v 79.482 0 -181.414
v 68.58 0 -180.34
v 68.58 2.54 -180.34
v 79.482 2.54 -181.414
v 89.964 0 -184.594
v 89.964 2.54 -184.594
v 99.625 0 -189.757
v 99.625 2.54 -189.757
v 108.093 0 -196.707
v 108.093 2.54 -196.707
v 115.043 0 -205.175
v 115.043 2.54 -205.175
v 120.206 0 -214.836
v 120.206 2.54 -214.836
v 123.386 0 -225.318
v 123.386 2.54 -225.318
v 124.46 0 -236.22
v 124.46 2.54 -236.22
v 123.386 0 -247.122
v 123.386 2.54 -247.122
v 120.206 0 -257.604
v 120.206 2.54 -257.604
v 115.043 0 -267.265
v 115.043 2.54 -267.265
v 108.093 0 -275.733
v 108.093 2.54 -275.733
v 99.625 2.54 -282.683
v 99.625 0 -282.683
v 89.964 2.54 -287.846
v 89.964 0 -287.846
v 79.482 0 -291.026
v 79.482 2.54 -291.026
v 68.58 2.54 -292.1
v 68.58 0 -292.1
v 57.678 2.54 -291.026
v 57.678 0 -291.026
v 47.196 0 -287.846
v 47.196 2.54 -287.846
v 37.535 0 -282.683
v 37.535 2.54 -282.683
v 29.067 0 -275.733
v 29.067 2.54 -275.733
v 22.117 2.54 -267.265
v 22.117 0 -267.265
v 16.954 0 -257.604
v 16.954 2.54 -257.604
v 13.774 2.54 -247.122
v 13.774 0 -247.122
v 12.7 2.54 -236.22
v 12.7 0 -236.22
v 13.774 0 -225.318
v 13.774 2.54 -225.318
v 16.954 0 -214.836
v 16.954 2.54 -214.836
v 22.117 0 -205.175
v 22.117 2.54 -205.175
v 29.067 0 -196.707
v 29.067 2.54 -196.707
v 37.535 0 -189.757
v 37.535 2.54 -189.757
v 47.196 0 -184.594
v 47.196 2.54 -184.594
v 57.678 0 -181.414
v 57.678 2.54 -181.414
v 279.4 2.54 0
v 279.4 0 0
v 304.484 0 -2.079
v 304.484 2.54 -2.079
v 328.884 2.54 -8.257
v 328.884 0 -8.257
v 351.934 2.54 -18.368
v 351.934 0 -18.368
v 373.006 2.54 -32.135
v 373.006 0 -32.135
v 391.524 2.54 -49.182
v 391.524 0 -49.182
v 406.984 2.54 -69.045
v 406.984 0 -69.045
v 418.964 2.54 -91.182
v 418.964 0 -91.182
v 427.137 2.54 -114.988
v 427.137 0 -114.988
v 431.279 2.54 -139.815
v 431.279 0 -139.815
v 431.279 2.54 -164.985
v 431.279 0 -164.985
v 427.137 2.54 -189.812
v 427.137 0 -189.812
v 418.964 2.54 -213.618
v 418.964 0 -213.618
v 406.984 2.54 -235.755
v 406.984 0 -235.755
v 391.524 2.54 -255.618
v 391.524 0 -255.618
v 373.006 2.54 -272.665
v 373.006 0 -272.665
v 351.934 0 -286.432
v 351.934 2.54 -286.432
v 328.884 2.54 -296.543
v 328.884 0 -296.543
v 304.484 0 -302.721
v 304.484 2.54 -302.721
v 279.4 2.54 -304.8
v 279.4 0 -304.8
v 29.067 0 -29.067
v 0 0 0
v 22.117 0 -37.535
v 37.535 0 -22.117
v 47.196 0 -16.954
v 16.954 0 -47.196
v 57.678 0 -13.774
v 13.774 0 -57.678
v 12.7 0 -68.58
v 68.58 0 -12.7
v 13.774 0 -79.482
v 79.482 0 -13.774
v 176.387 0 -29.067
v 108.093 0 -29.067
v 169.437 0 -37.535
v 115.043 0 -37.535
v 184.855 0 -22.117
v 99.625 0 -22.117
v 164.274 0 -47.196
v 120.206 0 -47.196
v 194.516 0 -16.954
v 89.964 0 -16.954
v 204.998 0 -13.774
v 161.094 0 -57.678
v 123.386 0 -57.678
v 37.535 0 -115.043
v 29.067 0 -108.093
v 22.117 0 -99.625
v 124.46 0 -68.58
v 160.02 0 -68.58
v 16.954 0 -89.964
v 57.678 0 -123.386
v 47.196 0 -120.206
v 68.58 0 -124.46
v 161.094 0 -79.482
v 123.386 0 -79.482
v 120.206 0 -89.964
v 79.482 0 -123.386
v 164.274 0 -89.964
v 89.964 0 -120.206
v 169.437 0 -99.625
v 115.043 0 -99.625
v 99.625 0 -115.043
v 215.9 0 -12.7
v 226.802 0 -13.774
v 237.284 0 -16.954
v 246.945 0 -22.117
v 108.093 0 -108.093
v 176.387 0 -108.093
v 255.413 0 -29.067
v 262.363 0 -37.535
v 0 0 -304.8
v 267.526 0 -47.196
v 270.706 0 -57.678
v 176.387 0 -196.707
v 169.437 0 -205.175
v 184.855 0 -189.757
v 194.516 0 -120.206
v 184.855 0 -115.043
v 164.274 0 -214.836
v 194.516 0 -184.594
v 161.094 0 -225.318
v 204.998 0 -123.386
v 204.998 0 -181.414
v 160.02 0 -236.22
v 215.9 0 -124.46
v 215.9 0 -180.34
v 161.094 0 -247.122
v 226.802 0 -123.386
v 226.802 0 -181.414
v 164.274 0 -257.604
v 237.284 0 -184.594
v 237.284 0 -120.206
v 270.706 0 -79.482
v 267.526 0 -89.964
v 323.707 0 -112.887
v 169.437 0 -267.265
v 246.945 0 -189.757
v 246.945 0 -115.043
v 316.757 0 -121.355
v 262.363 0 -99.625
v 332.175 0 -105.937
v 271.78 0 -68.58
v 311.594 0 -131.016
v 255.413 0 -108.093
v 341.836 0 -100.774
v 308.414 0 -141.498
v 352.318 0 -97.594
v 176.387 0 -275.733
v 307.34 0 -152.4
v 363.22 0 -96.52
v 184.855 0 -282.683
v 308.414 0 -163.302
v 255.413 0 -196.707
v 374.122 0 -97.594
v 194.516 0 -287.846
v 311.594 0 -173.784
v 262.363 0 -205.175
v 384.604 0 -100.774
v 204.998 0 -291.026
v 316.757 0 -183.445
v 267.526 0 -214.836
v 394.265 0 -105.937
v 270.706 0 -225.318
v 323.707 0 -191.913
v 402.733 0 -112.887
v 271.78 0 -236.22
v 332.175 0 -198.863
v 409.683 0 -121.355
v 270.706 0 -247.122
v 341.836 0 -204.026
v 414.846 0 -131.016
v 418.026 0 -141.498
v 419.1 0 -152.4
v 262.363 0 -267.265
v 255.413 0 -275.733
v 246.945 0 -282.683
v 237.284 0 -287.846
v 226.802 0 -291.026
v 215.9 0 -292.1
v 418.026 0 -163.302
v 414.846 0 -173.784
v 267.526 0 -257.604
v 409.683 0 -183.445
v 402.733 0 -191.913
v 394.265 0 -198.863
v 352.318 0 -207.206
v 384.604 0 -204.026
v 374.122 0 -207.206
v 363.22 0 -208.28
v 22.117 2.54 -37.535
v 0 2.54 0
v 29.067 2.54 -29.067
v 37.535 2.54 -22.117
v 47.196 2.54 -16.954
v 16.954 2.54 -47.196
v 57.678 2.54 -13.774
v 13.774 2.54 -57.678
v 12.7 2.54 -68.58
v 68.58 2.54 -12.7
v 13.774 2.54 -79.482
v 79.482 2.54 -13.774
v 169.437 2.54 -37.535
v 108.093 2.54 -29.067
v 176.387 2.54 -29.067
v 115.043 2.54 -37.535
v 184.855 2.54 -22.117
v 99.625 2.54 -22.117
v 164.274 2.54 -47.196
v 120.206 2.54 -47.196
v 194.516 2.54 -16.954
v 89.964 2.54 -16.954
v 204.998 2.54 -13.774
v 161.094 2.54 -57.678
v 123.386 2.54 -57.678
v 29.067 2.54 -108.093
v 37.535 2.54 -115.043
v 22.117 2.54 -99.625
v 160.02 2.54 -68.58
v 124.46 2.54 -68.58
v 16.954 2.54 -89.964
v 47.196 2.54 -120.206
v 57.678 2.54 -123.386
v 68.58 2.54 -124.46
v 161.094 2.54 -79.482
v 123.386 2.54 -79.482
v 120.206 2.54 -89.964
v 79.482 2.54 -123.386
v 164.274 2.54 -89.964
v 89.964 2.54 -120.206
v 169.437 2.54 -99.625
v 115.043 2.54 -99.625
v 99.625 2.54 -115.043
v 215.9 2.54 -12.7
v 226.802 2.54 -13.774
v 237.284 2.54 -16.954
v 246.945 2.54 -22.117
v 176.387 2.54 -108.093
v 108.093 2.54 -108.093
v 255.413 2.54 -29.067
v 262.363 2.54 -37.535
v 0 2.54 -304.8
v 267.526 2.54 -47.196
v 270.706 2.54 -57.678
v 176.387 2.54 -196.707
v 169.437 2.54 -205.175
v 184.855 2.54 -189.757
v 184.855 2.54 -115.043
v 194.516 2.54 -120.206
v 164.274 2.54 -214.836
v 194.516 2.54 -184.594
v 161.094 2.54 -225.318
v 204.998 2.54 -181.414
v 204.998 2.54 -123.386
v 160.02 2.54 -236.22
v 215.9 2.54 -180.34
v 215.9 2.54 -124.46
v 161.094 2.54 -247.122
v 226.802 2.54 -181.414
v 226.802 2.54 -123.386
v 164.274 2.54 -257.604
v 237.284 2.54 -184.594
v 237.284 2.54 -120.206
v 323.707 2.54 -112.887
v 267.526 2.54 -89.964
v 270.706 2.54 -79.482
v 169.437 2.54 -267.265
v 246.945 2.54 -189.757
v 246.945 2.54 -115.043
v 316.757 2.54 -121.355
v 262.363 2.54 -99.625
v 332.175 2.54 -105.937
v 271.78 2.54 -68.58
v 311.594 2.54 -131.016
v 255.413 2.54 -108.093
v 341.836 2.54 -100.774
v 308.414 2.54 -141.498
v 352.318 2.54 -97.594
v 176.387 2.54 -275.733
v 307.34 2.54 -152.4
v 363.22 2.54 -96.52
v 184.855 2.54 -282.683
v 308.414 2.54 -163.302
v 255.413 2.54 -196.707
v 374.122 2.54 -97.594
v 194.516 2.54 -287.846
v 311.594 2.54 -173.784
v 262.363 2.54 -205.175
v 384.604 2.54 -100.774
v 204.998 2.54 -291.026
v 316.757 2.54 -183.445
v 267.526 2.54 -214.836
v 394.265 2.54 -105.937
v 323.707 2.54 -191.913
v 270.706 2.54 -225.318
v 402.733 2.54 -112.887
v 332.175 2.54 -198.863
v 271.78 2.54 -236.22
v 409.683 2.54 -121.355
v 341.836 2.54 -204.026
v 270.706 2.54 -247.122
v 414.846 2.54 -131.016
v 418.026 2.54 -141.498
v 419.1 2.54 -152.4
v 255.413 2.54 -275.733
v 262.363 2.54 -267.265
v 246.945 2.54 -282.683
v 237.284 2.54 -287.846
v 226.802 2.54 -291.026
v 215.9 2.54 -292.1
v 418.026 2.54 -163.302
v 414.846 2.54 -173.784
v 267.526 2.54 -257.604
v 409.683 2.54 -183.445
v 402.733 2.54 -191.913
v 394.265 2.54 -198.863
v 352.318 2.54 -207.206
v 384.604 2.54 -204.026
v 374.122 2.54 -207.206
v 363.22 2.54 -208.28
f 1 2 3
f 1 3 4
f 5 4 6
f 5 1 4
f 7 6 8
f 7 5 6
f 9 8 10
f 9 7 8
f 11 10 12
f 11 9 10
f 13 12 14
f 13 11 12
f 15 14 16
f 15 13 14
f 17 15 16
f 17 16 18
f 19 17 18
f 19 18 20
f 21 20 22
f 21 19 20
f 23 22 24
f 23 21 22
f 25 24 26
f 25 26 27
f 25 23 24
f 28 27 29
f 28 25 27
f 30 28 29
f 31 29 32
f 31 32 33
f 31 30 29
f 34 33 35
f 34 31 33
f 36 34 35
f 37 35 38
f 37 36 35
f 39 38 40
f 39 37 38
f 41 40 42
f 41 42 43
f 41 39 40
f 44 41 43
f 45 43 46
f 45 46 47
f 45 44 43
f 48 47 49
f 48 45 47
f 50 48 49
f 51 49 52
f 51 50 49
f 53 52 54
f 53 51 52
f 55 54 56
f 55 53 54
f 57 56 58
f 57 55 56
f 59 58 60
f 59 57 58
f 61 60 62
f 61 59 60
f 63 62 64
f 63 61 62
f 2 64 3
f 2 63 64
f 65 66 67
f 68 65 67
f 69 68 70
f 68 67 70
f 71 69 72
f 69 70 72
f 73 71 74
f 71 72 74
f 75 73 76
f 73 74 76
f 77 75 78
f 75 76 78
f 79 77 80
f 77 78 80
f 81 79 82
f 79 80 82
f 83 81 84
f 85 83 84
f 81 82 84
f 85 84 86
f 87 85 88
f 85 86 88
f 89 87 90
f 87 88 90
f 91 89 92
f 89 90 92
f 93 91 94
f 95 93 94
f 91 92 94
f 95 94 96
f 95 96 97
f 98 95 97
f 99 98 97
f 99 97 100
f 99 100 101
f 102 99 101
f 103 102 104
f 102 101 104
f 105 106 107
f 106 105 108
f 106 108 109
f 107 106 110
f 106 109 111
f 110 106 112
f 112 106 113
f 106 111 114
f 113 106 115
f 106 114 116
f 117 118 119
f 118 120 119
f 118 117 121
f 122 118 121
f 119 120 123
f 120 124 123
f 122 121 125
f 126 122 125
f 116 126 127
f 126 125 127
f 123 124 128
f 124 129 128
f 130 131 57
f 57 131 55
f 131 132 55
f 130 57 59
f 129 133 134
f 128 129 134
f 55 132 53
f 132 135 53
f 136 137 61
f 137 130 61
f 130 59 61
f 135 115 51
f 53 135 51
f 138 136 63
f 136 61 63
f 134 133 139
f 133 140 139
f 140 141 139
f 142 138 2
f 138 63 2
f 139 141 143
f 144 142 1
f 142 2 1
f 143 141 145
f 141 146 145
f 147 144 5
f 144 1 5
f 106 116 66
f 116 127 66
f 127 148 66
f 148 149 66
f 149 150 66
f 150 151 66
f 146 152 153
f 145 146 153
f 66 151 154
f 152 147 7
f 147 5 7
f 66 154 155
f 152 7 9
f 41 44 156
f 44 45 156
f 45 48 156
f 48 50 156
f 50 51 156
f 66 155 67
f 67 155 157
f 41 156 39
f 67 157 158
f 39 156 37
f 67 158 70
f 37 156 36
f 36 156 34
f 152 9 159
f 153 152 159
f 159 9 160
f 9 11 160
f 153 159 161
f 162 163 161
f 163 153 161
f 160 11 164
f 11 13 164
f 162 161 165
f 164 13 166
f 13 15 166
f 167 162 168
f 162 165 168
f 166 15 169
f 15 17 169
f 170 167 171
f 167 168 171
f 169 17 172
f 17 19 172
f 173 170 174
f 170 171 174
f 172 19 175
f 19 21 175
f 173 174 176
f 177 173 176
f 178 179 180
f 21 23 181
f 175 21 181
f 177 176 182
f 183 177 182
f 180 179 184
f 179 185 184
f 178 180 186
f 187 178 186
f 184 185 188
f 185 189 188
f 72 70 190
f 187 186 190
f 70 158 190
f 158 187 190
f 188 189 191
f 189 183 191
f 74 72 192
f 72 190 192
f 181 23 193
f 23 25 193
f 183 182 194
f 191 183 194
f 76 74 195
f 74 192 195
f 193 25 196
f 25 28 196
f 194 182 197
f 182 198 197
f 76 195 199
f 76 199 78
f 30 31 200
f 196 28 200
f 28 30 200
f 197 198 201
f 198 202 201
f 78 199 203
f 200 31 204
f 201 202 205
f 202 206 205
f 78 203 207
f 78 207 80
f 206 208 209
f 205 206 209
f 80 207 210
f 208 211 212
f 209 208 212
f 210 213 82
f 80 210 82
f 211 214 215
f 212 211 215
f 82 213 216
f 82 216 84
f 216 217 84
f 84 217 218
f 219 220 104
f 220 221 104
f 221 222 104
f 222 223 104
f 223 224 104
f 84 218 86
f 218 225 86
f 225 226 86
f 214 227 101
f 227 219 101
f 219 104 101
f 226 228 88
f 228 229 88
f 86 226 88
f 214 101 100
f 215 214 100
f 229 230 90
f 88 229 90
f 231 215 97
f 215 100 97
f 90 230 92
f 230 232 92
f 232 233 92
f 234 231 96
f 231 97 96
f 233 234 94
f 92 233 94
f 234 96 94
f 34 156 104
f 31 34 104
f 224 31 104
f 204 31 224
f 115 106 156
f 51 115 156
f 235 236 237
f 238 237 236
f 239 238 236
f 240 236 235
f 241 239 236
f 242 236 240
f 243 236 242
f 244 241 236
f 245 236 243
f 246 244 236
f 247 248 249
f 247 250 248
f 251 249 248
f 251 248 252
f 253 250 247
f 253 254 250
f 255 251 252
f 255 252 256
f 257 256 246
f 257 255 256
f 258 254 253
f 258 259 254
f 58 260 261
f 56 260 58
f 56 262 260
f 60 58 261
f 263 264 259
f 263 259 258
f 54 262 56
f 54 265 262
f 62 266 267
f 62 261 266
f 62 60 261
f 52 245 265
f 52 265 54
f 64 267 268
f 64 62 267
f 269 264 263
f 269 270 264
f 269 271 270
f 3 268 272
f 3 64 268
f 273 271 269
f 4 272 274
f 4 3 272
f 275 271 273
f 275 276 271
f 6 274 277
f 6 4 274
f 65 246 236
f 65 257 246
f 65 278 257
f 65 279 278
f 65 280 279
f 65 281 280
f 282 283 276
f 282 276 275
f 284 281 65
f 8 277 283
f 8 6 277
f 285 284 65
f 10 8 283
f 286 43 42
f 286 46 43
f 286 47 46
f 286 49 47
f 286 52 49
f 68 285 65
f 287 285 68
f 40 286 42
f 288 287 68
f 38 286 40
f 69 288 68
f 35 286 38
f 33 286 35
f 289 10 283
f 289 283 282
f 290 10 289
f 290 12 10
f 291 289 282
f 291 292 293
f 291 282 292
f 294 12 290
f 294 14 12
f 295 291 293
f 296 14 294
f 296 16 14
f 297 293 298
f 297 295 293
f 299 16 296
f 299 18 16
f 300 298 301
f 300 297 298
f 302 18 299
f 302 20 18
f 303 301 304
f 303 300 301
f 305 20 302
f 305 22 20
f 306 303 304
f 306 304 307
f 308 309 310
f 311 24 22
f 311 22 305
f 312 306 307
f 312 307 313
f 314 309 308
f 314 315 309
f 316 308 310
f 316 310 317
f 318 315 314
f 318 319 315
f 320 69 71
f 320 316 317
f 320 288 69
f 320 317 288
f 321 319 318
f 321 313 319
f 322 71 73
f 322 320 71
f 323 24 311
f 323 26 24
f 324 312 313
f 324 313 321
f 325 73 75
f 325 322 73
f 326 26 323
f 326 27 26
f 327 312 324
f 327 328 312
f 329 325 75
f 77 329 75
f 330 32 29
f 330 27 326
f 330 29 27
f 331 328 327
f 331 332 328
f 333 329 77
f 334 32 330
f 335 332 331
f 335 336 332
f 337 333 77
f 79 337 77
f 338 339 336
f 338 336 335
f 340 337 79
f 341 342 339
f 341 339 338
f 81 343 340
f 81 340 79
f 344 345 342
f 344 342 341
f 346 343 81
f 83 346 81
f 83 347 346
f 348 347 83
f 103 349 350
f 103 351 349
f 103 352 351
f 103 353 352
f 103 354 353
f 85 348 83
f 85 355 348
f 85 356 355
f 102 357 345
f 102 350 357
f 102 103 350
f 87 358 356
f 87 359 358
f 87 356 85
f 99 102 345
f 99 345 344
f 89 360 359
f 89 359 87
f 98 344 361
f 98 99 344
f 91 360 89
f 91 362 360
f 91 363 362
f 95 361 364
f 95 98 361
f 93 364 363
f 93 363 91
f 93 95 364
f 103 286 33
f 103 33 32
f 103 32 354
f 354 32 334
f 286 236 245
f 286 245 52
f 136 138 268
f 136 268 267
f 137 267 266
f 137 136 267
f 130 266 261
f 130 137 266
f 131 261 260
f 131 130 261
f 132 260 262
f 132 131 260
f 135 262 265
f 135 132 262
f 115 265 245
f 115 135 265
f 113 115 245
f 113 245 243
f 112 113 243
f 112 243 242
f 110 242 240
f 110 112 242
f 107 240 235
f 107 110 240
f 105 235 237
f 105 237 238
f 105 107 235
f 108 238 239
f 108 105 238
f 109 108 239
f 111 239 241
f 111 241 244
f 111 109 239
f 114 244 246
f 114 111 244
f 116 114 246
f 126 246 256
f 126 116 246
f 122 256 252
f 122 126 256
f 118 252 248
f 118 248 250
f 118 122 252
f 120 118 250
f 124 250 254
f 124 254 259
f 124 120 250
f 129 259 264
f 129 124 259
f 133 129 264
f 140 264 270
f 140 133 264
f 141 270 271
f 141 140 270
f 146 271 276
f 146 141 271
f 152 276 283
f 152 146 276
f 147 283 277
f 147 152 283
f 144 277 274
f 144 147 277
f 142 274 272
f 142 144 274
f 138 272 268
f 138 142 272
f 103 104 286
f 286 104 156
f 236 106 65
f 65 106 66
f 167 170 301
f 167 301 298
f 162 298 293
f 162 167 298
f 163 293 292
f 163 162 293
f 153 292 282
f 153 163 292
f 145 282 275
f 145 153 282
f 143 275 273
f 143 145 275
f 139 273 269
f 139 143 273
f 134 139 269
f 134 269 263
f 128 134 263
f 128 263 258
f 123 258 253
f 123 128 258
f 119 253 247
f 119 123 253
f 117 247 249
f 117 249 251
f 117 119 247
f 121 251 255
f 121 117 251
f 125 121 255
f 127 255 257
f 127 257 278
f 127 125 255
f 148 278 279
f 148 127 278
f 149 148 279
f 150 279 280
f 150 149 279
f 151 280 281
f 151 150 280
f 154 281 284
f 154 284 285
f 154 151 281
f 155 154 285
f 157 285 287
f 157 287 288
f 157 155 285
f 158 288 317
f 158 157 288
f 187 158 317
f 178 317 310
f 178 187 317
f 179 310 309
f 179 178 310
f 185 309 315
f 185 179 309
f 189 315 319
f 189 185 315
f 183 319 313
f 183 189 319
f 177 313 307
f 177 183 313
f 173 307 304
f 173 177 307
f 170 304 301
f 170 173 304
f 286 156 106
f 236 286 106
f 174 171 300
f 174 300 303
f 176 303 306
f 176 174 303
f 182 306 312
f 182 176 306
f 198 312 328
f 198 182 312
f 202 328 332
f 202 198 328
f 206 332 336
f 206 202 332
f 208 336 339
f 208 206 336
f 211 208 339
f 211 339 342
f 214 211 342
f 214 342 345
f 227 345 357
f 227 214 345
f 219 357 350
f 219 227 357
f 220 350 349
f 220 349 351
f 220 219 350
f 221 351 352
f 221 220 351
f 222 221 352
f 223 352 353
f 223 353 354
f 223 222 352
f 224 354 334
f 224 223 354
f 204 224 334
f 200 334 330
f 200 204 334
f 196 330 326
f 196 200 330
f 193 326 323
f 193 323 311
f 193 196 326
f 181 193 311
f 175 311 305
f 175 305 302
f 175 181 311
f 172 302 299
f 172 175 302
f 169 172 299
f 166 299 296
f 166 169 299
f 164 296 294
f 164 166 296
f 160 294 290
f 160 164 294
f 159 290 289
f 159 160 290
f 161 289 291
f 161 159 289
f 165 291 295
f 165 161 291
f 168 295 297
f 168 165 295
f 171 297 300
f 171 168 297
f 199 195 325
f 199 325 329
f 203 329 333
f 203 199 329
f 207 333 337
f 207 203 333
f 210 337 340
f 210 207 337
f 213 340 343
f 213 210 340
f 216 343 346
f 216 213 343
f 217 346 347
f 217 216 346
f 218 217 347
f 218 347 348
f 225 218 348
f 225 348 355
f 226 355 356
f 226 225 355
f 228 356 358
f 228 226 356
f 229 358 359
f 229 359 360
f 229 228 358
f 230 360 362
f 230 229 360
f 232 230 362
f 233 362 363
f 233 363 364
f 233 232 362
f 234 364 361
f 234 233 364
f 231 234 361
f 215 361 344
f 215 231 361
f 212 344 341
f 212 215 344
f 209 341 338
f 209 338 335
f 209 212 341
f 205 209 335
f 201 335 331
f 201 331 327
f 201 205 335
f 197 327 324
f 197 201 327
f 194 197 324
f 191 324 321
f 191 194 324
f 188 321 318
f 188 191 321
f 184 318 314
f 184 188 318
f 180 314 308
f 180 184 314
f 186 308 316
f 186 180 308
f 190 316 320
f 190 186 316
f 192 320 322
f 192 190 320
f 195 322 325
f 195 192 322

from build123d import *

# Parameters (mm, degrees)
SKETCH1_R           = 55.88
BOSS_EXTRUDE1_DEPTH = 2.54


with BuildPart() as part:
    # Sketch1 → Boss-Extrude1 (new body)
    with BuildSketch(Plane(origin=(0, 0, 0), x_dir=(1, 0, 0), z_dir=(0, 1, 0))):
        with BuildLine():
            Line((0, 0), (279.4, 0))
            ThreePointArc((279.4, 0), (431.8, 152.4), (279.4, 304.8))
            Line((279.4, 304.8), (0, 304.8))
            Line((0, 304.8), (0, 0))
        make_face()
        with Locations(Location((68.58, 236.22, 0), (0, 0, 270))):
            Circle(SKETCH1_R, mode=Mode.SUBTRACT)
        with Locations(Location((215.9, 236.22, 0), (0, 0, 270))):
            Circle(SKETCH1_R, mode=Mode.SUBTRACT)
        with Locations(Location((363.22, 152.4, 0), (0, 0, 270))):
            Circle(SKETCH1_R, mode=Mode.SUBTRACT)
        with Locations(Location((68.58, 68.58, 0), (0, 0, 90))):
            Circle(SKETCH1_R, mode=Mode.SUBTRACT)
        with Locations(Location((215.9, 68.58, 0), (0, 0, 90))):
            Circle(SKETCH1_R, mode=Mode.SUBTRACT)
    extrude(amount=BOSS_EXTRUDE1_DEPTH)


solid = part.part
